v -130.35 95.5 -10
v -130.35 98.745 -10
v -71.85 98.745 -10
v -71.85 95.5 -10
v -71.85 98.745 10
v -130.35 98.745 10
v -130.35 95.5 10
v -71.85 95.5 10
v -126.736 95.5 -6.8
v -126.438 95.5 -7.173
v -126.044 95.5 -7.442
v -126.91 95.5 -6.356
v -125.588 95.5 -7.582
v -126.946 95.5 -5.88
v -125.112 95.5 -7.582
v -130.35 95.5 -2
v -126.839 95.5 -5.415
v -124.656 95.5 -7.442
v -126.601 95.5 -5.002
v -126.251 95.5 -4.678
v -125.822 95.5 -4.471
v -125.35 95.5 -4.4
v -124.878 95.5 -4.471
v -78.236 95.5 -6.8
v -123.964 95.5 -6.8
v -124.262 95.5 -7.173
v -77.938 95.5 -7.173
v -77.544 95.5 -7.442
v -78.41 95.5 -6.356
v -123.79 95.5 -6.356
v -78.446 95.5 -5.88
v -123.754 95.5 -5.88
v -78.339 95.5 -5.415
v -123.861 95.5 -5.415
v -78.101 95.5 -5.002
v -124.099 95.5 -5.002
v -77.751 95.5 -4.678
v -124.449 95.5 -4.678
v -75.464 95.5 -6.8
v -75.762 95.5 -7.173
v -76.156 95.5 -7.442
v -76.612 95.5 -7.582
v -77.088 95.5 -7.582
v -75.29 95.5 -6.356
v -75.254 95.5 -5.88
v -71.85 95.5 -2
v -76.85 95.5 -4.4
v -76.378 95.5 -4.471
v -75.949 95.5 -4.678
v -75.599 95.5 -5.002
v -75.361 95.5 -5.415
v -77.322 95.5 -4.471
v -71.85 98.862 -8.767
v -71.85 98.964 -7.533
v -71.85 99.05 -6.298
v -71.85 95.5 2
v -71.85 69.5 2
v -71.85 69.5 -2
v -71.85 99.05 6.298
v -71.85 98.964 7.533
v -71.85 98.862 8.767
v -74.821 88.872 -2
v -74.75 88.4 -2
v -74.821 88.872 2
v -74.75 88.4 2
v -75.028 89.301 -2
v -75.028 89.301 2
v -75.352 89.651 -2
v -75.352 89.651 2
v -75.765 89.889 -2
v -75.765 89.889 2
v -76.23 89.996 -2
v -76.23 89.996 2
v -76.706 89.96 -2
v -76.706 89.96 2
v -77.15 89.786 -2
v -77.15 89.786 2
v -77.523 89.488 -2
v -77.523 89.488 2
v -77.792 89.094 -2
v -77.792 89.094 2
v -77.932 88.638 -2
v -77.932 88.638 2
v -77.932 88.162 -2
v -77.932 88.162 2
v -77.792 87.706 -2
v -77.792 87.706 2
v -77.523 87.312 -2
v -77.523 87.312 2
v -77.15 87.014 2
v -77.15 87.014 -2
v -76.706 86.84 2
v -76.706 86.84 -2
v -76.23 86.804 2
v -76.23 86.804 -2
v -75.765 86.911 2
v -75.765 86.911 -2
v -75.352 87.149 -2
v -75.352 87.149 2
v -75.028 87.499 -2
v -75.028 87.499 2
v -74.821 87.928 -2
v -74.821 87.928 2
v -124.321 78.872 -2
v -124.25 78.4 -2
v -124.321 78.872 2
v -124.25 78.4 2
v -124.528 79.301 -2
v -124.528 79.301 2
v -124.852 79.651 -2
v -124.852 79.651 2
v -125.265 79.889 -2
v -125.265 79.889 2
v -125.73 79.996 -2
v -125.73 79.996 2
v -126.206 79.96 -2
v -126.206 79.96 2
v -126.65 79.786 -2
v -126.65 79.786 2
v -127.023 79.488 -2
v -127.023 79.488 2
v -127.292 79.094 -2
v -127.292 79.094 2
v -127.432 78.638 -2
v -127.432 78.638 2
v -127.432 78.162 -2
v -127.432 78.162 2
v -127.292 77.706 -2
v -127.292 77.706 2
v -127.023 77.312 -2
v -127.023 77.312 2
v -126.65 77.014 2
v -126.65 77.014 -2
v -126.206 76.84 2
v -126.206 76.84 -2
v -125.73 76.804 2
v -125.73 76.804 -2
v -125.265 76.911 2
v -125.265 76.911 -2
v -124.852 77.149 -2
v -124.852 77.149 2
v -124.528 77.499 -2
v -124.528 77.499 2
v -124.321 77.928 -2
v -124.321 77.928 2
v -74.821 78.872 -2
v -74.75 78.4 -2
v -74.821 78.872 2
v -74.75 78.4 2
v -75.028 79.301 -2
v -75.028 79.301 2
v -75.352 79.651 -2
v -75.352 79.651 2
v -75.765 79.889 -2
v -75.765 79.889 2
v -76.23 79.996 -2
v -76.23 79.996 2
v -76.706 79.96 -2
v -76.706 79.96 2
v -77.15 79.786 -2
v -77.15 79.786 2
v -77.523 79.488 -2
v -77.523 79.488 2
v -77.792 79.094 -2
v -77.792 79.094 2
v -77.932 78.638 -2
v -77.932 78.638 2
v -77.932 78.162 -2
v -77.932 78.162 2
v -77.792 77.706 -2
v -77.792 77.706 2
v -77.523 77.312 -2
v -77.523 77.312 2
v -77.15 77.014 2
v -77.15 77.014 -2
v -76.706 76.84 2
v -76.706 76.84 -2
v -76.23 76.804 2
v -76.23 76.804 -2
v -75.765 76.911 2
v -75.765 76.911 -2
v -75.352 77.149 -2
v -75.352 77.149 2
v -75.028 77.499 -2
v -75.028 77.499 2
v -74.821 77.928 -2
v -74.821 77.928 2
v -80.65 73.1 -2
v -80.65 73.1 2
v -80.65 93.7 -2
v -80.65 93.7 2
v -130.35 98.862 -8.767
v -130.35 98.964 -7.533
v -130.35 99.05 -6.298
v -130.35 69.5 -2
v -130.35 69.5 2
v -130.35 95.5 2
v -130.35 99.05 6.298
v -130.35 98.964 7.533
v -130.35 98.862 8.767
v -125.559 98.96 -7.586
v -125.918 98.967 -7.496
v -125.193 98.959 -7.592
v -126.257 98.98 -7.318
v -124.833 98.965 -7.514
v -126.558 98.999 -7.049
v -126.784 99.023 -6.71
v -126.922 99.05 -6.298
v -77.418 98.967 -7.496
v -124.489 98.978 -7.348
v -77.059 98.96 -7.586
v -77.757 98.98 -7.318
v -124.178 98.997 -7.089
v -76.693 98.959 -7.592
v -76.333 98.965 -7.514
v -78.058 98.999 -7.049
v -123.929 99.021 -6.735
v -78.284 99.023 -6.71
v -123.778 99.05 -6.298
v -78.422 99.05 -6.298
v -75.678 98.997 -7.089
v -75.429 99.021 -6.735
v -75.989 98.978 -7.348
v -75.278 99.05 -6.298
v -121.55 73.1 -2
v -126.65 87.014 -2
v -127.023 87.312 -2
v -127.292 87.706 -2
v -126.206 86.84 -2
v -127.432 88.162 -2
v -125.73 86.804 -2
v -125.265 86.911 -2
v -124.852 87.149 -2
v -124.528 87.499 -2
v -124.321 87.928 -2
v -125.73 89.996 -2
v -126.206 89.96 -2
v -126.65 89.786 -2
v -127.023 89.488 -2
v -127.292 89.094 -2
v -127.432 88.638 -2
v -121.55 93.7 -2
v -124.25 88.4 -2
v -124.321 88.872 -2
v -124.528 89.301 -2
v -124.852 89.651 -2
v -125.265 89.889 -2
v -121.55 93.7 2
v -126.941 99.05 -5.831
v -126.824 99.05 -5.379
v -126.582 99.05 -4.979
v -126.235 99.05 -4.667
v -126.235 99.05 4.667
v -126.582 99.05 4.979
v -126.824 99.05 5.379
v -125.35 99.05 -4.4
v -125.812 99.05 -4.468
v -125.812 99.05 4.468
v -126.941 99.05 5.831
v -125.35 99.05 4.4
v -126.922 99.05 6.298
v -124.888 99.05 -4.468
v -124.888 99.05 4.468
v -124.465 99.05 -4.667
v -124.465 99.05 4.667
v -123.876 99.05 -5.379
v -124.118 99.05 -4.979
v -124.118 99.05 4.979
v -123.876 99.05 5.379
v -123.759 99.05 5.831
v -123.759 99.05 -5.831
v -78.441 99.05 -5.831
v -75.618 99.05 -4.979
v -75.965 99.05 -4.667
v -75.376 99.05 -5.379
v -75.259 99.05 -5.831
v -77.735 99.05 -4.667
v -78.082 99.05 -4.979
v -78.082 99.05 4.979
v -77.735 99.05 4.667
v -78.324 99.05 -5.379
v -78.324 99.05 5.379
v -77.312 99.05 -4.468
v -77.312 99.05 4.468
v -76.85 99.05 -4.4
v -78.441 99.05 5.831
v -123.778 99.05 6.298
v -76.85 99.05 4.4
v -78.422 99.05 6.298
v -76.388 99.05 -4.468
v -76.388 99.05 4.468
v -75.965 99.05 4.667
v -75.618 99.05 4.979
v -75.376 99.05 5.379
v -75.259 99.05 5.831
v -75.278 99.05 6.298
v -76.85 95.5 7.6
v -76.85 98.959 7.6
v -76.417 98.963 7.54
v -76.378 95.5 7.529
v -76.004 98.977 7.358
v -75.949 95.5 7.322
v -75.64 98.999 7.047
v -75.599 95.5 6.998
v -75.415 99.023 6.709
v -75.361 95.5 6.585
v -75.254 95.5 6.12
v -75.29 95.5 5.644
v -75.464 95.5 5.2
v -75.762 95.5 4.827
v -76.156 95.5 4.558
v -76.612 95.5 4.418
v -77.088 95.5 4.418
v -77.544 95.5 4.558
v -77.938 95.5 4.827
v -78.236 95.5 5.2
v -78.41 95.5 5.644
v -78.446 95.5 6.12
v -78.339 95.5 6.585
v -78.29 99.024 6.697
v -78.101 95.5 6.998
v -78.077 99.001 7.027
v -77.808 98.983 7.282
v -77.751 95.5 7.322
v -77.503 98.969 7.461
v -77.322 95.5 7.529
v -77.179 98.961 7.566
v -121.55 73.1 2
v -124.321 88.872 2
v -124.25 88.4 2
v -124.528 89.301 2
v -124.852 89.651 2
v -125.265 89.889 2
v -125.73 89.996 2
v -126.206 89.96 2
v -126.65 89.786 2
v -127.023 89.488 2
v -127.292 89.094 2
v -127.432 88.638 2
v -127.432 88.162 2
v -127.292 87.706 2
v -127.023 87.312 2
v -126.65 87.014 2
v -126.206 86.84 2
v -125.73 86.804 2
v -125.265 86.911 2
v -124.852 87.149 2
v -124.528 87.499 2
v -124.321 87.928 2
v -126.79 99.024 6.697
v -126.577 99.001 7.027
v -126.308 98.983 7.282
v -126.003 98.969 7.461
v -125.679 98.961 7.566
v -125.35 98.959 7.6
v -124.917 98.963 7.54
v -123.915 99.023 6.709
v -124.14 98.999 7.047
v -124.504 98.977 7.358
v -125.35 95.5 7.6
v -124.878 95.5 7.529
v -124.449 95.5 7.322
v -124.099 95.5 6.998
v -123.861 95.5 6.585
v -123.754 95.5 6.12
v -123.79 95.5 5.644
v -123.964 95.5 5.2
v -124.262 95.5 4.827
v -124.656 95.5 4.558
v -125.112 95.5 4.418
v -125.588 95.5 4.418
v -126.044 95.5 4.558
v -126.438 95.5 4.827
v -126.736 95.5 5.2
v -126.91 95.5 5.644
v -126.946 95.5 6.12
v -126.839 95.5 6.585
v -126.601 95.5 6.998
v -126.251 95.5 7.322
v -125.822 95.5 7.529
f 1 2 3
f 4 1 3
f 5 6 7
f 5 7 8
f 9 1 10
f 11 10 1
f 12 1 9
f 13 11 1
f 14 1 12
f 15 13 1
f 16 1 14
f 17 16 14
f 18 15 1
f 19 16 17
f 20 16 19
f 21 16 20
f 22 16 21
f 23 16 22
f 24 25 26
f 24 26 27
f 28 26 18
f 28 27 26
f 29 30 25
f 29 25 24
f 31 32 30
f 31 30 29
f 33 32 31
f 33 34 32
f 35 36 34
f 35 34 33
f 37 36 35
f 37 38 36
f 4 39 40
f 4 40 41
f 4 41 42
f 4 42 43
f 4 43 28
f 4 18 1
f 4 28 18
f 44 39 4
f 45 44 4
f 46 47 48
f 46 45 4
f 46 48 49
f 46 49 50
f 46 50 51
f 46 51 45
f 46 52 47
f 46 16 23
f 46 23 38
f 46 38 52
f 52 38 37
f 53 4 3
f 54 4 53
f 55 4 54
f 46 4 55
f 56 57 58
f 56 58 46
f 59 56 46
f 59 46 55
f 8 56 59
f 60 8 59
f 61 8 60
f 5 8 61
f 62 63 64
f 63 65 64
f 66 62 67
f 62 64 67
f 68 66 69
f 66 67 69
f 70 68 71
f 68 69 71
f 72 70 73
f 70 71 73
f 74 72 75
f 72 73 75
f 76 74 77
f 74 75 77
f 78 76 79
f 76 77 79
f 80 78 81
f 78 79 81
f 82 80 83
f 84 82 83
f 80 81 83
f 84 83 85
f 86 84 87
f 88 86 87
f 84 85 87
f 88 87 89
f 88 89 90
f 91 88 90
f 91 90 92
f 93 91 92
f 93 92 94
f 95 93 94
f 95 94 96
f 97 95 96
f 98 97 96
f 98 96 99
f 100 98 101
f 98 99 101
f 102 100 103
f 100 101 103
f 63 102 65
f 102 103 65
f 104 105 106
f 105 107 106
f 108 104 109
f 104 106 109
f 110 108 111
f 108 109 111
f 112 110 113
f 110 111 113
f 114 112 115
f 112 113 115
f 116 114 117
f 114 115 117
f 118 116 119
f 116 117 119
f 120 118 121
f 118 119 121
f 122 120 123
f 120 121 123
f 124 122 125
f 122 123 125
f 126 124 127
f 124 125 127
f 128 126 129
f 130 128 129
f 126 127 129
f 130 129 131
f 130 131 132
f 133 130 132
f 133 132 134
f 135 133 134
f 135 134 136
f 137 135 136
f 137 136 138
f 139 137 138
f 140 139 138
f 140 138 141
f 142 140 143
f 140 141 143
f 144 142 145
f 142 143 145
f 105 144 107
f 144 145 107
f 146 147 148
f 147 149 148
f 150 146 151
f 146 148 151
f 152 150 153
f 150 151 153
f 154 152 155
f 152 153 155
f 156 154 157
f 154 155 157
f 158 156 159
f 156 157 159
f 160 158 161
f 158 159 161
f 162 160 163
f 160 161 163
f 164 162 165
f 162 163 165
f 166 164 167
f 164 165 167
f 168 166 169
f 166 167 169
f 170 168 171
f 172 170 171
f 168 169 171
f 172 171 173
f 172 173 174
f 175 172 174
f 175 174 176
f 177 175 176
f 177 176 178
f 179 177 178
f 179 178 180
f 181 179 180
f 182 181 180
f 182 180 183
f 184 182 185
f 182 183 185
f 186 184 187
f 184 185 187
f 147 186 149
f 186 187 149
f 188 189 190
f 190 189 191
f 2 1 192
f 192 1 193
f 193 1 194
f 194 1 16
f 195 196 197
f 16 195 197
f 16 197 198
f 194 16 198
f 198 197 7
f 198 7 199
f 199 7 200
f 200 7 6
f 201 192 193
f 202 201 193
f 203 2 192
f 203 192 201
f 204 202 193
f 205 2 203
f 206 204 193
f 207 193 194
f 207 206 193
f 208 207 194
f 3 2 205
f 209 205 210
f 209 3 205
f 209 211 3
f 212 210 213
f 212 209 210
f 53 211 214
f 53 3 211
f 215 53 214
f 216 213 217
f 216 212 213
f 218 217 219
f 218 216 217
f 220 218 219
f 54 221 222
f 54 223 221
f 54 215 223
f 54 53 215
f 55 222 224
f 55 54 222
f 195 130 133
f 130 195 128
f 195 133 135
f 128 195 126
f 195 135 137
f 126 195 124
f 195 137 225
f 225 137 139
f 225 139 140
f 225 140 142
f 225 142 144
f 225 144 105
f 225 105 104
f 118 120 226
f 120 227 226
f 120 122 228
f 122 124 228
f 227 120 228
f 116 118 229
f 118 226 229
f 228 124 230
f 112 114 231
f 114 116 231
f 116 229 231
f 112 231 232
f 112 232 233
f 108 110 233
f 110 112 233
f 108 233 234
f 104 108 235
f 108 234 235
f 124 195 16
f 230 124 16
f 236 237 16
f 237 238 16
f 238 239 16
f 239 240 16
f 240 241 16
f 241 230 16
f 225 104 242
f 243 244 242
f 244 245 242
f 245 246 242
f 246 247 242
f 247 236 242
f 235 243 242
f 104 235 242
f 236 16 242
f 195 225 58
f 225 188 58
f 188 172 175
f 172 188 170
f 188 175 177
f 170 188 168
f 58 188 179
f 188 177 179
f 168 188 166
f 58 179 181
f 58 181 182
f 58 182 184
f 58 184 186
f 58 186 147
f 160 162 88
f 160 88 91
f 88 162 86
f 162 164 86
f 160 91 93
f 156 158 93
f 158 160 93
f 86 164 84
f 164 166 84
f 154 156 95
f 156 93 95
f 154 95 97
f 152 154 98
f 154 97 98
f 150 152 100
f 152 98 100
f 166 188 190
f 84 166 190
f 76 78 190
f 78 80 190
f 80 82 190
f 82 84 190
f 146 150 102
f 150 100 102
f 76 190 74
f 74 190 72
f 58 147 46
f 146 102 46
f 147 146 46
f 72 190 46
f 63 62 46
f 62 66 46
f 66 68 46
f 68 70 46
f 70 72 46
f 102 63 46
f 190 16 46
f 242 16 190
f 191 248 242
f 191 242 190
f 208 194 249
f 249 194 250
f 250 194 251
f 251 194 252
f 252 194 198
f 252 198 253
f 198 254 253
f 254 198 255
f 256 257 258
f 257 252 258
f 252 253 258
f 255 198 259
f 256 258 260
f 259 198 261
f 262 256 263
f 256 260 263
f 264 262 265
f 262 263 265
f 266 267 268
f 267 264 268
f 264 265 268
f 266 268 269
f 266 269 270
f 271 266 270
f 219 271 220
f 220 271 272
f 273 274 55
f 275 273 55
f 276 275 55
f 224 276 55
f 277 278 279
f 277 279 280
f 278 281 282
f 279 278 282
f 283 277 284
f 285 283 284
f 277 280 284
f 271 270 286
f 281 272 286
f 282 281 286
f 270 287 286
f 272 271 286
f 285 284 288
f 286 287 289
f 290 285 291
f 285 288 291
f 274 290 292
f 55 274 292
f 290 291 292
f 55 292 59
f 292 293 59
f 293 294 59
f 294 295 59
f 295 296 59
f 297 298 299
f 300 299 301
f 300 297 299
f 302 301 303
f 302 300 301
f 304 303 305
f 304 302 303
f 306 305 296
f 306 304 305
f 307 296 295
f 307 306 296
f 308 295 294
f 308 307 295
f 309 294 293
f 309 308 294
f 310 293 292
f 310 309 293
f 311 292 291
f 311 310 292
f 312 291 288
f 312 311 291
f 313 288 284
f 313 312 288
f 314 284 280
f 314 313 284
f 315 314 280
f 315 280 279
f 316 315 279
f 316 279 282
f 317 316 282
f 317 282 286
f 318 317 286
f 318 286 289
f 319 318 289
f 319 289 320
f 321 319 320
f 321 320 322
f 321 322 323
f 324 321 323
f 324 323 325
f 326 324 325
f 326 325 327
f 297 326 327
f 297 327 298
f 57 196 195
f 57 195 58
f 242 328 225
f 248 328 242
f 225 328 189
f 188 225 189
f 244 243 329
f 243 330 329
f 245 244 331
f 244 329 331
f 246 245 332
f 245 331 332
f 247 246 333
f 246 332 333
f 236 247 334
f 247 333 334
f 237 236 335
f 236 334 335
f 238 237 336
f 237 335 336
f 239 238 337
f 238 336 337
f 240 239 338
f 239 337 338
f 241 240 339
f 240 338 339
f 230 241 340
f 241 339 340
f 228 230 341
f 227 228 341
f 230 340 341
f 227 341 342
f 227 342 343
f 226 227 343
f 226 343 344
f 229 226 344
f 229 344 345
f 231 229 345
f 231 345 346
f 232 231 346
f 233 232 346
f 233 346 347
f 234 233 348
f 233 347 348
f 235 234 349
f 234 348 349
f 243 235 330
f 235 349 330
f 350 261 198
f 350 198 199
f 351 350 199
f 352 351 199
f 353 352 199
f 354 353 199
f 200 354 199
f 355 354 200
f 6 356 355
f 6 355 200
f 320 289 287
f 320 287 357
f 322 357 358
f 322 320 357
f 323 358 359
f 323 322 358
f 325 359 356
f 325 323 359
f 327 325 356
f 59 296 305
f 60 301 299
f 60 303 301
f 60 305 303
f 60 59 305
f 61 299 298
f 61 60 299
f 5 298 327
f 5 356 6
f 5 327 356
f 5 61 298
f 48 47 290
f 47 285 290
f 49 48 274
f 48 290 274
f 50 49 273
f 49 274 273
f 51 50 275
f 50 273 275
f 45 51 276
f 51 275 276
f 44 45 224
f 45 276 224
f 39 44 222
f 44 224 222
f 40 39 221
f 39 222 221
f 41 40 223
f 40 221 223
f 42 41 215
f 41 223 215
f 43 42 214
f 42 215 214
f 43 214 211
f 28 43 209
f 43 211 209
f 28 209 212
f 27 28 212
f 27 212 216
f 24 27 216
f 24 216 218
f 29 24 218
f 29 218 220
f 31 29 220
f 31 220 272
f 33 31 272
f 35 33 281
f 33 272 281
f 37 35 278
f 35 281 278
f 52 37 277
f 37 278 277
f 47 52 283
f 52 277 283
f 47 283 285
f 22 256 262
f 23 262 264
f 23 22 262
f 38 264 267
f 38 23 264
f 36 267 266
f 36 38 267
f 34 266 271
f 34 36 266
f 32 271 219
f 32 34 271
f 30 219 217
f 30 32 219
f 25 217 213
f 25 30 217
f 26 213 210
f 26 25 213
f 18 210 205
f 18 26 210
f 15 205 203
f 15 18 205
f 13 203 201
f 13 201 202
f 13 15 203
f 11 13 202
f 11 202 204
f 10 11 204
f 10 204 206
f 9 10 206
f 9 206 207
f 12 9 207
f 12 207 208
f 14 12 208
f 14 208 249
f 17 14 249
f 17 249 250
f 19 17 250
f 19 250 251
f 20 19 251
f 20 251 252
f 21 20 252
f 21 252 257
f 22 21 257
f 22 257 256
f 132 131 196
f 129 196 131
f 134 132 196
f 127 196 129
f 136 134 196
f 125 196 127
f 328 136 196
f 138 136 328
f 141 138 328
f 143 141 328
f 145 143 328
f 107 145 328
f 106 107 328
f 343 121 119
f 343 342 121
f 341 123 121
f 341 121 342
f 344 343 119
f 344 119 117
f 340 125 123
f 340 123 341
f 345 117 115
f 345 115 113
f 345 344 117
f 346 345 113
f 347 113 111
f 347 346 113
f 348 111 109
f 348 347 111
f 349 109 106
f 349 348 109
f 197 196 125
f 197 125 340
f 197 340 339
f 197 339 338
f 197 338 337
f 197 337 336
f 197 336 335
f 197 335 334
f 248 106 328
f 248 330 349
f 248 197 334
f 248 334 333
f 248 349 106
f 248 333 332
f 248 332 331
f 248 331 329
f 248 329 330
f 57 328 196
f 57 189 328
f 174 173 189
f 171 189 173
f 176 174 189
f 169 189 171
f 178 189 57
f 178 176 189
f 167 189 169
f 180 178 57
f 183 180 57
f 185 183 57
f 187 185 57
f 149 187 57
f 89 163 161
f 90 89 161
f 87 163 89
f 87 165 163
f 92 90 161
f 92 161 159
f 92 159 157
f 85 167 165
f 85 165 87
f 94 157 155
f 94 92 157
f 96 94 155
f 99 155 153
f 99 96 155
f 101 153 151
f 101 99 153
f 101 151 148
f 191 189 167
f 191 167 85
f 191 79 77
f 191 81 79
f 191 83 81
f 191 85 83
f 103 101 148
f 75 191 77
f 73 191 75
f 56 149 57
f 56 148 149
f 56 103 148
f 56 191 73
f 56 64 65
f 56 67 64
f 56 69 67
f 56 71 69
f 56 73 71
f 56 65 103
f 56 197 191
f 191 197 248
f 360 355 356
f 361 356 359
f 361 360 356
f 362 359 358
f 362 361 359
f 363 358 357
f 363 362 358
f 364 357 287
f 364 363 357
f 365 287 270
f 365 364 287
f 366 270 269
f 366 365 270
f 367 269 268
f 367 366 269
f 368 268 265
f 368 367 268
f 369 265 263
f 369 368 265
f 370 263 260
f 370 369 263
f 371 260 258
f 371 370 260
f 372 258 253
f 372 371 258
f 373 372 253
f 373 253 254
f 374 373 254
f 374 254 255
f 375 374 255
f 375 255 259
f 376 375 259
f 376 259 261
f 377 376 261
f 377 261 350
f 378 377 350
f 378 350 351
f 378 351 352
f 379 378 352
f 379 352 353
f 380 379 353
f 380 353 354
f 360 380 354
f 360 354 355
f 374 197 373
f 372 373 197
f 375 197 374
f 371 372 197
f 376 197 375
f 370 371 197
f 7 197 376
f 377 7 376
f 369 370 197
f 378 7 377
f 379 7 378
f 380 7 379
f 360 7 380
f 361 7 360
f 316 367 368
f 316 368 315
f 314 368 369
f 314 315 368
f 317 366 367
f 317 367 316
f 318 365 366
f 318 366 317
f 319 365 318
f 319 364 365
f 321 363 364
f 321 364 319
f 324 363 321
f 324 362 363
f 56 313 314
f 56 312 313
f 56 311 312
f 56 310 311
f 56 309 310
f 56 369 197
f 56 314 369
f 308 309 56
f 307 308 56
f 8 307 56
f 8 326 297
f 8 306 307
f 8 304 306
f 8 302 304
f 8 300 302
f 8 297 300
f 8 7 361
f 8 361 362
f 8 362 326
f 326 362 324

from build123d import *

# Parameters (mm, degrees)
WEB_SKETCH_W               = 58.5
WEB_SKETCH_H               = 26
WEB_DEPTH                  = 2
FLANGE_SKETCH_W            = 58.5
FLANGE_SKETCH_H            = 3.55
FLANGE_DEPTH               = 10
FLANGE_TO_TUBE_SKETCH_W    = 60.5
FLANGE_TO_TUBE_SKETCH_H    = 1.8
SERVO_CUTOUT_SKETCH_W      = 40.9
SERVO_CUTOUT_SKETCH_H      = 20.6
SERVO_CUTOUT_DEPTH         = 3
SERVO_SCREW_HOLES_SKETCH_R = 1.6
SERVO_SCREW_HOLES_DEPTH    = 3
TUBE_SCREW_HOLES_SKETCH_R  = 1.6
TUBE_SCREW_HOLES_DEPTH     = 104.05


with BuildPart() as part:
    # Web Sketch → Web (new, symmetric)
    with BuildSketch(Plane.XY):
        with Locations((-101.1, 82.5)):
            Rectangle(WEB_SKETCH_W, WEB_SKETCH_H)
    extrude(amount=WEB_DEPTH, both=True)

    # Flange Sketch → Flange (add, symmetric)
    with BuildSketch(Plane.XY):
        with Locations((-101.1, 97.275)):
            Rectangle(FLANGE_SKETCH_W, FLANGE_SKETCH_H)
    extrude(amount=FLANGE_DEPTH, both=True)

    # Flange To Tube Sketch → Flange To Tube (revolve, cut)
    with BuildSketch(Plane.XY):
        with Locations((-101.1, 100.15)):
            Rectangle(FLANGE_TO_TUBE_SKETCH_W, FLANGE_TO_TUBE_SKETCH_H)
    revolve(axis=Axis((-180.35, 0, 0), (1, 0, 0)), mode=Mode.SUBTRACT)

    # Servo Cutout Sketch → Servo Cutout (cut, symmetric)
    with BuildSketch(Plane.XY):
        with Locations((-101.1, 83.4)):
            Rectangle(SERVO_CUTOUT_SKETCH_W, SERVO_CUTOUT_SKETCH_H)
    extrude(amount=SERVO_CUTOUT_DEPTH, both=True, mode=Mode.SUBTRACT)

    # Servo Screw Holes Sketch → Servo Screw Holes (cut, symmetric)
    with BuildSketch(Plane.XY):
        with Locations((-125.85, 78.4)):
            Circle(SERVO_SCREW_HOLES_SKETCH_R)
        with Locations((-125.85, 88.4)):
            Circle(SERVO_SCREW_HOLES_SKETCH_R)
        with Locations((-76.35, 78.4)):
            Circle(SERVO_SCREW_HOLES_SKETCH_R)
        with Locations((-76.35, 88.4)):
            Circle(SERVO_SCREW_HOLES_SKETCH_R)
    extrude(amount=SERVO_SCREW_HOLES_DEPTH, both=True, mode=Mode.SUBTRACT)

    # Tube Screw Holes Sketch → Tube Screw Holes (cut, symmetric)
    with BuildSketch(Plane(origin=(0, 0, 0), x_dir=(1, 0, 0), z_dir=(0, 1, 0))):
        with Locations((-125.35, -6)):
            Circle(TUBE_SCREW_HOLES_SKETCH_R)
        with Locations((-125.35, 6)):
            Circle(TUBE_SCREW_HOLES_SKETCH_R)
        with Locations((-76.85, -6)):
            Circle(TUBE_SCREW_HOLES_SKETCH_R)
        with Locations((-76.85, 6)):
            Circle(TUBE_SCREW_HOLES_SKETCH_R)
    extrude(amount=TUBE_SCREW_HOLES_DEPTH, both=True, mode=Mode.SUBTRACT)


solid = part.part
